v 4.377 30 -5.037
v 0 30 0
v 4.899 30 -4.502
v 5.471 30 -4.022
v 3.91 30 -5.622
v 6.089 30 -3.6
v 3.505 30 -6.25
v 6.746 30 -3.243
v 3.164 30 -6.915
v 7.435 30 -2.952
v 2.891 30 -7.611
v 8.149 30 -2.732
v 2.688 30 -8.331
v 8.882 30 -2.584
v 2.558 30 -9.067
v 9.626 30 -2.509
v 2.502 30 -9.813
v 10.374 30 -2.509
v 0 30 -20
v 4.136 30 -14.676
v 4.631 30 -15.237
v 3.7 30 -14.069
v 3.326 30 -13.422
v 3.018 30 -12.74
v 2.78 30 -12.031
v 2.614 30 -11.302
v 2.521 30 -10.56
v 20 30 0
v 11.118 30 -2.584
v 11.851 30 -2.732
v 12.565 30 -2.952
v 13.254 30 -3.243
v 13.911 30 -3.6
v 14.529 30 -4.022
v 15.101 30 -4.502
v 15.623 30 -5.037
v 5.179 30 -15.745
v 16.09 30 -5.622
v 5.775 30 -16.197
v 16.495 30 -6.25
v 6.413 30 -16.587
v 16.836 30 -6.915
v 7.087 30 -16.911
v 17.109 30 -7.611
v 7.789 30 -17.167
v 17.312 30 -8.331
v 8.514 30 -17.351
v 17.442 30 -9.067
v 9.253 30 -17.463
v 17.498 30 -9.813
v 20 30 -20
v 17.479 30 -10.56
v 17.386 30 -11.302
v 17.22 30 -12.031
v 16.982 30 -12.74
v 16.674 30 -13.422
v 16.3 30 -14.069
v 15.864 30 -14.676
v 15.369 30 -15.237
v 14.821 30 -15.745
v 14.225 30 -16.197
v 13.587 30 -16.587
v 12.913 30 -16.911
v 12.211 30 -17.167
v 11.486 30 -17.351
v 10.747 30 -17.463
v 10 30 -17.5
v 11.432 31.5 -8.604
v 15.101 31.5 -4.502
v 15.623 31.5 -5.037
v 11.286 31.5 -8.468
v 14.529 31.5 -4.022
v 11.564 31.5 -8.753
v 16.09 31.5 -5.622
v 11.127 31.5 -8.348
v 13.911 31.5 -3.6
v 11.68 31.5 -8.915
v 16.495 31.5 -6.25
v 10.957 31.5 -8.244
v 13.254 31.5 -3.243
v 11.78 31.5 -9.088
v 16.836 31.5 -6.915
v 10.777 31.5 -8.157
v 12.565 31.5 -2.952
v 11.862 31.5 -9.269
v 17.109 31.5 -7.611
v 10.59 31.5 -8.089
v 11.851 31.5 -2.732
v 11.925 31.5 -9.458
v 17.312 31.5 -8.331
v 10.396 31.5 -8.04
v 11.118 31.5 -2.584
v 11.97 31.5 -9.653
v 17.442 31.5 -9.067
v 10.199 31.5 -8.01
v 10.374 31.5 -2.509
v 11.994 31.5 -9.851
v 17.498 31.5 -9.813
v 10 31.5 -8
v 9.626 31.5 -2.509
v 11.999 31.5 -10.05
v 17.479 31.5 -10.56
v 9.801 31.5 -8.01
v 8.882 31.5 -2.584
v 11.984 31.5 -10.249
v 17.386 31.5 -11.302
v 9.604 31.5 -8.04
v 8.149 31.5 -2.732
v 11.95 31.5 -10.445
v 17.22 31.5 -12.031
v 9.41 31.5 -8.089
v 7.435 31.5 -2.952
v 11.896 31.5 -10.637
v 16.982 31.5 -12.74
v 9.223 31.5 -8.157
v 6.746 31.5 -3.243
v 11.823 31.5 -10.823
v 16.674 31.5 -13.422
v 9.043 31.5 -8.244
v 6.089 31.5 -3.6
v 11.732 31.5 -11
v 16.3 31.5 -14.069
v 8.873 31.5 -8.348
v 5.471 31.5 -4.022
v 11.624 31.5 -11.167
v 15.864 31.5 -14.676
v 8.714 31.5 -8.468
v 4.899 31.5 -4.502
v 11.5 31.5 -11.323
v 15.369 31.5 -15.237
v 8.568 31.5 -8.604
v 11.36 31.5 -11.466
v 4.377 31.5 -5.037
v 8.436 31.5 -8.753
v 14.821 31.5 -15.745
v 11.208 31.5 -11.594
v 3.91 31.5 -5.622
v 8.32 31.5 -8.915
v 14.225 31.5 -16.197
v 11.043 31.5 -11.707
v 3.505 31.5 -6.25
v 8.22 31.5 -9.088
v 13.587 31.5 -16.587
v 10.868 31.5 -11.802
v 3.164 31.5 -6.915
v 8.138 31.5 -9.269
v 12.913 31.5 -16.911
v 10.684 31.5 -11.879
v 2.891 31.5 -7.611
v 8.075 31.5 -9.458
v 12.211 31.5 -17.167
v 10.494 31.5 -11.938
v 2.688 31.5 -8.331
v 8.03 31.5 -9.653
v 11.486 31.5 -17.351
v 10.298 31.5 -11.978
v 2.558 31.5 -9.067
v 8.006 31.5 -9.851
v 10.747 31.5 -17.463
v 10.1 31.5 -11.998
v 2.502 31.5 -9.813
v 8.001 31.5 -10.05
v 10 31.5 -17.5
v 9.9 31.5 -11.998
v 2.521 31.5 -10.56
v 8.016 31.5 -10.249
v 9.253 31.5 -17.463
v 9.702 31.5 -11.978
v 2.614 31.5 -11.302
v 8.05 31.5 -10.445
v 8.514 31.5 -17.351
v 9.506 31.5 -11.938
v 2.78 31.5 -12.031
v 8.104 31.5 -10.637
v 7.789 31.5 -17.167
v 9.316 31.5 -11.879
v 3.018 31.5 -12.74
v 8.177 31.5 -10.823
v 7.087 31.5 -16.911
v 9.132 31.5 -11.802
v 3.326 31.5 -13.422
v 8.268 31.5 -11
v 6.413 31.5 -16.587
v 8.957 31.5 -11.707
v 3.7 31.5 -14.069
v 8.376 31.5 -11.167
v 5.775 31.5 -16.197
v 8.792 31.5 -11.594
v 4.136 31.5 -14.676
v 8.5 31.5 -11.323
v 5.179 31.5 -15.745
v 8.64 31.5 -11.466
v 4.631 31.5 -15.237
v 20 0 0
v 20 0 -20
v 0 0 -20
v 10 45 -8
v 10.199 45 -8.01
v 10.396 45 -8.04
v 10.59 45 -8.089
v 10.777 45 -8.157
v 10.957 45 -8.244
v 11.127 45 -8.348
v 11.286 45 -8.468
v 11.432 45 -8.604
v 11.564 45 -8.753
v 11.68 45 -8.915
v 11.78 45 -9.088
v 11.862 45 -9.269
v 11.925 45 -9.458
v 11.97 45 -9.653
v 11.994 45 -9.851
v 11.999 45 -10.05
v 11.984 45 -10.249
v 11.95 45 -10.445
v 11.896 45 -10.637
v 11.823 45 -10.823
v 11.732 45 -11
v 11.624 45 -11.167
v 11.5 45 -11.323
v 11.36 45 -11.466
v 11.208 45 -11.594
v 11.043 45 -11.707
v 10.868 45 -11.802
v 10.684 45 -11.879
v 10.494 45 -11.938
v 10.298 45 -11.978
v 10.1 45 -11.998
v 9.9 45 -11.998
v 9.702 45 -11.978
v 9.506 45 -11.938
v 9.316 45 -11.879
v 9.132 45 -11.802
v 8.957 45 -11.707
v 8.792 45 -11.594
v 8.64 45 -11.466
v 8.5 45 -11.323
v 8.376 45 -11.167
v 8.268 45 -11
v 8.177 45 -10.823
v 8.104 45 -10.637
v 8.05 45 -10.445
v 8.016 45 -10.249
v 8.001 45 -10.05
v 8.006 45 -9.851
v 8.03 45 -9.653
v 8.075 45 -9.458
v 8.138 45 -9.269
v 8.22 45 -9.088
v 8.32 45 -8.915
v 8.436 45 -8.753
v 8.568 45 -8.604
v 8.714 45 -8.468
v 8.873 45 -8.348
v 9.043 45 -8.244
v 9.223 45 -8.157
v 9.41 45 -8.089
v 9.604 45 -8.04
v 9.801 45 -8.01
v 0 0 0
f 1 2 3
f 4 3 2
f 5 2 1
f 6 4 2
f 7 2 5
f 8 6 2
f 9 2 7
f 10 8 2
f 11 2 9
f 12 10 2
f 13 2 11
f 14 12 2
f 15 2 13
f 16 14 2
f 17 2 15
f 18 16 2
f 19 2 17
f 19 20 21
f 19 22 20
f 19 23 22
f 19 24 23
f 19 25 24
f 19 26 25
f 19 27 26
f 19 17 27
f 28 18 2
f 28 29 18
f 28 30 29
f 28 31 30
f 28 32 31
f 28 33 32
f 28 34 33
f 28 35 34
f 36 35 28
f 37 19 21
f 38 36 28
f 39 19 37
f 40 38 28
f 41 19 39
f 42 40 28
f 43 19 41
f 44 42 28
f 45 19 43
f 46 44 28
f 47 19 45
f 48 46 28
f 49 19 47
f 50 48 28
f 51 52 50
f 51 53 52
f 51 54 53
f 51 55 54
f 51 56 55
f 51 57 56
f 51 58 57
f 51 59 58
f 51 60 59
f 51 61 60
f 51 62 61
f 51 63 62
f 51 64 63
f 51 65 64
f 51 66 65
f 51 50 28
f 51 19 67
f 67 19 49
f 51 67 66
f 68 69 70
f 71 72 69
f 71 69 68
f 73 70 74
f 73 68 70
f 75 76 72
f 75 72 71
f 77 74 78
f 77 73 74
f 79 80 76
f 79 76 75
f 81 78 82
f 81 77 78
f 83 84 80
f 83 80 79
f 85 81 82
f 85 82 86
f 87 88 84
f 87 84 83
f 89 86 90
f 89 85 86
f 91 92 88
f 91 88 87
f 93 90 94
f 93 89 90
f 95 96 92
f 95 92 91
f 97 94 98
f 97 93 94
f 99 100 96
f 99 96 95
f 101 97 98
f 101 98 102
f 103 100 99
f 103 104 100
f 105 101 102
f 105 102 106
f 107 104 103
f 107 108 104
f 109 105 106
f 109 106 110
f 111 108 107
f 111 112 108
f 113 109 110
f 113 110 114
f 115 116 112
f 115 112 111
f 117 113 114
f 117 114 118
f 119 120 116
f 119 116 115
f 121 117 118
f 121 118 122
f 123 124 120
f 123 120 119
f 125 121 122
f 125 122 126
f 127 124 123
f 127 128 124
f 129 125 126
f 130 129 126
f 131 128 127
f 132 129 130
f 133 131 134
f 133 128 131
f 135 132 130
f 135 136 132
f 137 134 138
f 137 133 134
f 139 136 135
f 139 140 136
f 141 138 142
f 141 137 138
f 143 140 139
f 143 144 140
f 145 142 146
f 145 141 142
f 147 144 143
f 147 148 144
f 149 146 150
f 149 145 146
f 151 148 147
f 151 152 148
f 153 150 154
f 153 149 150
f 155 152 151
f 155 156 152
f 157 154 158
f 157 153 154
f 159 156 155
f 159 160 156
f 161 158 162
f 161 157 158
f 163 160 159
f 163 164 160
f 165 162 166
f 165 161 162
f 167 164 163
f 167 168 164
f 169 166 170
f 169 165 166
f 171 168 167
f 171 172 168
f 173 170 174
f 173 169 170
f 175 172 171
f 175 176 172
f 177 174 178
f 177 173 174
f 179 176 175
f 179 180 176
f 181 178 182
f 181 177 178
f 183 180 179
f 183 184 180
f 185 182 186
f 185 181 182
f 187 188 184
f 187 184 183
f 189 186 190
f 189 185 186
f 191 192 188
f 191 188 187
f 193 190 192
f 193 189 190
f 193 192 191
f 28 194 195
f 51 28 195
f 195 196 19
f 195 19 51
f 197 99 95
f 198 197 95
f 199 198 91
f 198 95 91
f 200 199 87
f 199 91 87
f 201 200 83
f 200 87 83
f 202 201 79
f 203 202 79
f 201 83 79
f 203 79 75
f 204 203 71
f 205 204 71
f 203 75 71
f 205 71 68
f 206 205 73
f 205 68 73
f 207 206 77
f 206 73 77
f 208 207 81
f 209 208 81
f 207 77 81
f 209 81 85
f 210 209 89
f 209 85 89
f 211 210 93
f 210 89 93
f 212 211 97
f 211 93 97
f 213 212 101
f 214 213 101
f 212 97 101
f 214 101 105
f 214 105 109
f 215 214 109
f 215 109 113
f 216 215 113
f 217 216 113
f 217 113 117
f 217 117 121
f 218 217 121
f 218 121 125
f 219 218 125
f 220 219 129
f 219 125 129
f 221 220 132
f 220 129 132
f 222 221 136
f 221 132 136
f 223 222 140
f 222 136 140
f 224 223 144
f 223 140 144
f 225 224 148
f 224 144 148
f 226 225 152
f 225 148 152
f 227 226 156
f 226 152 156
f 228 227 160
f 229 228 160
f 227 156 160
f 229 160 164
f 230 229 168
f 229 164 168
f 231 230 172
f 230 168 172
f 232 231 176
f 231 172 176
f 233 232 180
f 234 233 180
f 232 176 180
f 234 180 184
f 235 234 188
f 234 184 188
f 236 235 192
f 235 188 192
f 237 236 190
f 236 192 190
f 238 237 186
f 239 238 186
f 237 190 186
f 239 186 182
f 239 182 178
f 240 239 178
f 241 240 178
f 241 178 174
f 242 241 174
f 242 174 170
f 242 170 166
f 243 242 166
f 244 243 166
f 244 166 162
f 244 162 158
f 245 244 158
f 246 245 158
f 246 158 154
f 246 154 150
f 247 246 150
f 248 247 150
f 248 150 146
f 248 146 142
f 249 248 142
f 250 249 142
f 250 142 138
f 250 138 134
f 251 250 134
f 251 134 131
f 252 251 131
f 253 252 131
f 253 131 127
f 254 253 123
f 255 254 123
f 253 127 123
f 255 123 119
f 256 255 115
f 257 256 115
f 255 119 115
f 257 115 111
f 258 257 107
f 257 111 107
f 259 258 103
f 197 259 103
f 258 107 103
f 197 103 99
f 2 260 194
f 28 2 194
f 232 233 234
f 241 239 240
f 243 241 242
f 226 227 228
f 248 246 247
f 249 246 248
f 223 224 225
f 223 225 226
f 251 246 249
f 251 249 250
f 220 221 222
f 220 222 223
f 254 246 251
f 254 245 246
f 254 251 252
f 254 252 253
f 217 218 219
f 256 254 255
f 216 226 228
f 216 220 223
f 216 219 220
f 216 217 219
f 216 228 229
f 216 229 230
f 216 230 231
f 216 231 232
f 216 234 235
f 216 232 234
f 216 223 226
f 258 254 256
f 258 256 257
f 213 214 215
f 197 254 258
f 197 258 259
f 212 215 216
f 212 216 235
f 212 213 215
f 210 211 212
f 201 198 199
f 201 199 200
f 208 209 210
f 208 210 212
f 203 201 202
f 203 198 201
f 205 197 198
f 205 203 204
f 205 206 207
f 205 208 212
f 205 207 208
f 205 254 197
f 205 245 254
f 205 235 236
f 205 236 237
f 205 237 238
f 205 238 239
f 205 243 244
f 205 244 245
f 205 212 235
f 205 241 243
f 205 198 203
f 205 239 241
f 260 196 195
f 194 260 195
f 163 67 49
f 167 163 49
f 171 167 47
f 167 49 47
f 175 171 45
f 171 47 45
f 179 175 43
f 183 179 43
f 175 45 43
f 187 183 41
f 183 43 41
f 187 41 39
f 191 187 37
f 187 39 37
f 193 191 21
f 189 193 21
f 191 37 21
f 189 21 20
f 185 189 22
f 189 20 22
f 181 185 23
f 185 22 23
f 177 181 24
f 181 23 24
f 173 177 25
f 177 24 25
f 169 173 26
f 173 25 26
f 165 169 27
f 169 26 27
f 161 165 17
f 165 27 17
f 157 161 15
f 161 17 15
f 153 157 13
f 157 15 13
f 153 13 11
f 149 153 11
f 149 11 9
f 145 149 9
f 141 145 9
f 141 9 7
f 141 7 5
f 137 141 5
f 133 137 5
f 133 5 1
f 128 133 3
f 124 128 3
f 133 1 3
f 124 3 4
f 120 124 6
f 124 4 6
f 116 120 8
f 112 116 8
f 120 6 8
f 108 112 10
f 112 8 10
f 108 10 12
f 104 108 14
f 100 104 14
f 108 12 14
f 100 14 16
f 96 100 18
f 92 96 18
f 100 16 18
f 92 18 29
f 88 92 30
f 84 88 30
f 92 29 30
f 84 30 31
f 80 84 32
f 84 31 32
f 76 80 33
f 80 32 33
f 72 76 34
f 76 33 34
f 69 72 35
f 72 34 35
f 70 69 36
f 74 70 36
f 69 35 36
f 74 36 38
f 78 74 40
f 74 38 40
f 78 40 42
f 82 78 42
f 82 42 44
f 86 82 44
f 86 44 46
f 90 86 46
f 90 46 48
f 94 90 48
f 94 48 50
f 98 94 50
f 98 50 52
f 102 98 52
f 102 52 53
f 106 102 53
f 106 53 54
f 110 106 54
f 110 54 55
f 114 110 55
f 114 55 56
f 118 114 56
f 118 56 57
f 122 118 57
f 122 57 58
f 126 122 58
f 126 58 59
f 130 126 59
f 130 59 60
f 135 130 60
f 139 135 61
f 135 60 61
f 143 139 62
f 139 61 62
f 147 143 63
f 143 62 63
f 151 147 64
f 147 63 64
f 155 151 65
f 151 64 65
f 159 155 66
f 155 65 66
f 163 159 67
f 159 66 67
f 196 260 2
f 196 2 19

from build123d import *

# Parameters (mm, degrees)
SKETCH1_W           = 20
SKETCH1_H           = 20
BOSS_EXTRUDE1_DEPTH = 30
SKETCH2_R           = 7.5
BOSS_EXTRUDE2_DEPTH = 1.5
SKETCH3_R           = 2
BOSS_EXTRUDE4_DEPTH = 13.5


with BuildPart() as part:
    # Sketch1 → Boss-Extrude1 (new body)
    with BuildSketch(Plane(origin=(0, 0, 0), x_dir=(1, 0, 0), z_dir=(0, 1, 0))):
        with Locations((10, 10)):
            Rectangle(SKETCH1_W, SKETCH1_H)
    extrude(amount=BOSS_EXTRUDE1_DEPTH)

    # Sketch2 → Boss-Extrude2 (add)
    with BuildSketch(Plane(origin=(0, 30, 0), x_dir=(1, 0, 0), z_dir=(0, 1, 0))):
        with Locations(Location((10, 10, 0), (0, 0, 90))):
            Circle(SKETCH2_R)
    extrude(amount=BOSS_EXTRUDE2_DEPTH)

    # Sketch3 → Boss-Extrude4 (add)
    with BuildSketch(Plane(origin=(0, 31.5, 0), x_dir=(1, 0, 0), z_dir=(0, 1, 0))):
        with Locations(Location((10, 10, 0), (0, 0, 270))):
            Circle(SKETCH3_R)
    extrude(amount=BOSS_EXTRUDE4_DEPTH)


solid = part.part
